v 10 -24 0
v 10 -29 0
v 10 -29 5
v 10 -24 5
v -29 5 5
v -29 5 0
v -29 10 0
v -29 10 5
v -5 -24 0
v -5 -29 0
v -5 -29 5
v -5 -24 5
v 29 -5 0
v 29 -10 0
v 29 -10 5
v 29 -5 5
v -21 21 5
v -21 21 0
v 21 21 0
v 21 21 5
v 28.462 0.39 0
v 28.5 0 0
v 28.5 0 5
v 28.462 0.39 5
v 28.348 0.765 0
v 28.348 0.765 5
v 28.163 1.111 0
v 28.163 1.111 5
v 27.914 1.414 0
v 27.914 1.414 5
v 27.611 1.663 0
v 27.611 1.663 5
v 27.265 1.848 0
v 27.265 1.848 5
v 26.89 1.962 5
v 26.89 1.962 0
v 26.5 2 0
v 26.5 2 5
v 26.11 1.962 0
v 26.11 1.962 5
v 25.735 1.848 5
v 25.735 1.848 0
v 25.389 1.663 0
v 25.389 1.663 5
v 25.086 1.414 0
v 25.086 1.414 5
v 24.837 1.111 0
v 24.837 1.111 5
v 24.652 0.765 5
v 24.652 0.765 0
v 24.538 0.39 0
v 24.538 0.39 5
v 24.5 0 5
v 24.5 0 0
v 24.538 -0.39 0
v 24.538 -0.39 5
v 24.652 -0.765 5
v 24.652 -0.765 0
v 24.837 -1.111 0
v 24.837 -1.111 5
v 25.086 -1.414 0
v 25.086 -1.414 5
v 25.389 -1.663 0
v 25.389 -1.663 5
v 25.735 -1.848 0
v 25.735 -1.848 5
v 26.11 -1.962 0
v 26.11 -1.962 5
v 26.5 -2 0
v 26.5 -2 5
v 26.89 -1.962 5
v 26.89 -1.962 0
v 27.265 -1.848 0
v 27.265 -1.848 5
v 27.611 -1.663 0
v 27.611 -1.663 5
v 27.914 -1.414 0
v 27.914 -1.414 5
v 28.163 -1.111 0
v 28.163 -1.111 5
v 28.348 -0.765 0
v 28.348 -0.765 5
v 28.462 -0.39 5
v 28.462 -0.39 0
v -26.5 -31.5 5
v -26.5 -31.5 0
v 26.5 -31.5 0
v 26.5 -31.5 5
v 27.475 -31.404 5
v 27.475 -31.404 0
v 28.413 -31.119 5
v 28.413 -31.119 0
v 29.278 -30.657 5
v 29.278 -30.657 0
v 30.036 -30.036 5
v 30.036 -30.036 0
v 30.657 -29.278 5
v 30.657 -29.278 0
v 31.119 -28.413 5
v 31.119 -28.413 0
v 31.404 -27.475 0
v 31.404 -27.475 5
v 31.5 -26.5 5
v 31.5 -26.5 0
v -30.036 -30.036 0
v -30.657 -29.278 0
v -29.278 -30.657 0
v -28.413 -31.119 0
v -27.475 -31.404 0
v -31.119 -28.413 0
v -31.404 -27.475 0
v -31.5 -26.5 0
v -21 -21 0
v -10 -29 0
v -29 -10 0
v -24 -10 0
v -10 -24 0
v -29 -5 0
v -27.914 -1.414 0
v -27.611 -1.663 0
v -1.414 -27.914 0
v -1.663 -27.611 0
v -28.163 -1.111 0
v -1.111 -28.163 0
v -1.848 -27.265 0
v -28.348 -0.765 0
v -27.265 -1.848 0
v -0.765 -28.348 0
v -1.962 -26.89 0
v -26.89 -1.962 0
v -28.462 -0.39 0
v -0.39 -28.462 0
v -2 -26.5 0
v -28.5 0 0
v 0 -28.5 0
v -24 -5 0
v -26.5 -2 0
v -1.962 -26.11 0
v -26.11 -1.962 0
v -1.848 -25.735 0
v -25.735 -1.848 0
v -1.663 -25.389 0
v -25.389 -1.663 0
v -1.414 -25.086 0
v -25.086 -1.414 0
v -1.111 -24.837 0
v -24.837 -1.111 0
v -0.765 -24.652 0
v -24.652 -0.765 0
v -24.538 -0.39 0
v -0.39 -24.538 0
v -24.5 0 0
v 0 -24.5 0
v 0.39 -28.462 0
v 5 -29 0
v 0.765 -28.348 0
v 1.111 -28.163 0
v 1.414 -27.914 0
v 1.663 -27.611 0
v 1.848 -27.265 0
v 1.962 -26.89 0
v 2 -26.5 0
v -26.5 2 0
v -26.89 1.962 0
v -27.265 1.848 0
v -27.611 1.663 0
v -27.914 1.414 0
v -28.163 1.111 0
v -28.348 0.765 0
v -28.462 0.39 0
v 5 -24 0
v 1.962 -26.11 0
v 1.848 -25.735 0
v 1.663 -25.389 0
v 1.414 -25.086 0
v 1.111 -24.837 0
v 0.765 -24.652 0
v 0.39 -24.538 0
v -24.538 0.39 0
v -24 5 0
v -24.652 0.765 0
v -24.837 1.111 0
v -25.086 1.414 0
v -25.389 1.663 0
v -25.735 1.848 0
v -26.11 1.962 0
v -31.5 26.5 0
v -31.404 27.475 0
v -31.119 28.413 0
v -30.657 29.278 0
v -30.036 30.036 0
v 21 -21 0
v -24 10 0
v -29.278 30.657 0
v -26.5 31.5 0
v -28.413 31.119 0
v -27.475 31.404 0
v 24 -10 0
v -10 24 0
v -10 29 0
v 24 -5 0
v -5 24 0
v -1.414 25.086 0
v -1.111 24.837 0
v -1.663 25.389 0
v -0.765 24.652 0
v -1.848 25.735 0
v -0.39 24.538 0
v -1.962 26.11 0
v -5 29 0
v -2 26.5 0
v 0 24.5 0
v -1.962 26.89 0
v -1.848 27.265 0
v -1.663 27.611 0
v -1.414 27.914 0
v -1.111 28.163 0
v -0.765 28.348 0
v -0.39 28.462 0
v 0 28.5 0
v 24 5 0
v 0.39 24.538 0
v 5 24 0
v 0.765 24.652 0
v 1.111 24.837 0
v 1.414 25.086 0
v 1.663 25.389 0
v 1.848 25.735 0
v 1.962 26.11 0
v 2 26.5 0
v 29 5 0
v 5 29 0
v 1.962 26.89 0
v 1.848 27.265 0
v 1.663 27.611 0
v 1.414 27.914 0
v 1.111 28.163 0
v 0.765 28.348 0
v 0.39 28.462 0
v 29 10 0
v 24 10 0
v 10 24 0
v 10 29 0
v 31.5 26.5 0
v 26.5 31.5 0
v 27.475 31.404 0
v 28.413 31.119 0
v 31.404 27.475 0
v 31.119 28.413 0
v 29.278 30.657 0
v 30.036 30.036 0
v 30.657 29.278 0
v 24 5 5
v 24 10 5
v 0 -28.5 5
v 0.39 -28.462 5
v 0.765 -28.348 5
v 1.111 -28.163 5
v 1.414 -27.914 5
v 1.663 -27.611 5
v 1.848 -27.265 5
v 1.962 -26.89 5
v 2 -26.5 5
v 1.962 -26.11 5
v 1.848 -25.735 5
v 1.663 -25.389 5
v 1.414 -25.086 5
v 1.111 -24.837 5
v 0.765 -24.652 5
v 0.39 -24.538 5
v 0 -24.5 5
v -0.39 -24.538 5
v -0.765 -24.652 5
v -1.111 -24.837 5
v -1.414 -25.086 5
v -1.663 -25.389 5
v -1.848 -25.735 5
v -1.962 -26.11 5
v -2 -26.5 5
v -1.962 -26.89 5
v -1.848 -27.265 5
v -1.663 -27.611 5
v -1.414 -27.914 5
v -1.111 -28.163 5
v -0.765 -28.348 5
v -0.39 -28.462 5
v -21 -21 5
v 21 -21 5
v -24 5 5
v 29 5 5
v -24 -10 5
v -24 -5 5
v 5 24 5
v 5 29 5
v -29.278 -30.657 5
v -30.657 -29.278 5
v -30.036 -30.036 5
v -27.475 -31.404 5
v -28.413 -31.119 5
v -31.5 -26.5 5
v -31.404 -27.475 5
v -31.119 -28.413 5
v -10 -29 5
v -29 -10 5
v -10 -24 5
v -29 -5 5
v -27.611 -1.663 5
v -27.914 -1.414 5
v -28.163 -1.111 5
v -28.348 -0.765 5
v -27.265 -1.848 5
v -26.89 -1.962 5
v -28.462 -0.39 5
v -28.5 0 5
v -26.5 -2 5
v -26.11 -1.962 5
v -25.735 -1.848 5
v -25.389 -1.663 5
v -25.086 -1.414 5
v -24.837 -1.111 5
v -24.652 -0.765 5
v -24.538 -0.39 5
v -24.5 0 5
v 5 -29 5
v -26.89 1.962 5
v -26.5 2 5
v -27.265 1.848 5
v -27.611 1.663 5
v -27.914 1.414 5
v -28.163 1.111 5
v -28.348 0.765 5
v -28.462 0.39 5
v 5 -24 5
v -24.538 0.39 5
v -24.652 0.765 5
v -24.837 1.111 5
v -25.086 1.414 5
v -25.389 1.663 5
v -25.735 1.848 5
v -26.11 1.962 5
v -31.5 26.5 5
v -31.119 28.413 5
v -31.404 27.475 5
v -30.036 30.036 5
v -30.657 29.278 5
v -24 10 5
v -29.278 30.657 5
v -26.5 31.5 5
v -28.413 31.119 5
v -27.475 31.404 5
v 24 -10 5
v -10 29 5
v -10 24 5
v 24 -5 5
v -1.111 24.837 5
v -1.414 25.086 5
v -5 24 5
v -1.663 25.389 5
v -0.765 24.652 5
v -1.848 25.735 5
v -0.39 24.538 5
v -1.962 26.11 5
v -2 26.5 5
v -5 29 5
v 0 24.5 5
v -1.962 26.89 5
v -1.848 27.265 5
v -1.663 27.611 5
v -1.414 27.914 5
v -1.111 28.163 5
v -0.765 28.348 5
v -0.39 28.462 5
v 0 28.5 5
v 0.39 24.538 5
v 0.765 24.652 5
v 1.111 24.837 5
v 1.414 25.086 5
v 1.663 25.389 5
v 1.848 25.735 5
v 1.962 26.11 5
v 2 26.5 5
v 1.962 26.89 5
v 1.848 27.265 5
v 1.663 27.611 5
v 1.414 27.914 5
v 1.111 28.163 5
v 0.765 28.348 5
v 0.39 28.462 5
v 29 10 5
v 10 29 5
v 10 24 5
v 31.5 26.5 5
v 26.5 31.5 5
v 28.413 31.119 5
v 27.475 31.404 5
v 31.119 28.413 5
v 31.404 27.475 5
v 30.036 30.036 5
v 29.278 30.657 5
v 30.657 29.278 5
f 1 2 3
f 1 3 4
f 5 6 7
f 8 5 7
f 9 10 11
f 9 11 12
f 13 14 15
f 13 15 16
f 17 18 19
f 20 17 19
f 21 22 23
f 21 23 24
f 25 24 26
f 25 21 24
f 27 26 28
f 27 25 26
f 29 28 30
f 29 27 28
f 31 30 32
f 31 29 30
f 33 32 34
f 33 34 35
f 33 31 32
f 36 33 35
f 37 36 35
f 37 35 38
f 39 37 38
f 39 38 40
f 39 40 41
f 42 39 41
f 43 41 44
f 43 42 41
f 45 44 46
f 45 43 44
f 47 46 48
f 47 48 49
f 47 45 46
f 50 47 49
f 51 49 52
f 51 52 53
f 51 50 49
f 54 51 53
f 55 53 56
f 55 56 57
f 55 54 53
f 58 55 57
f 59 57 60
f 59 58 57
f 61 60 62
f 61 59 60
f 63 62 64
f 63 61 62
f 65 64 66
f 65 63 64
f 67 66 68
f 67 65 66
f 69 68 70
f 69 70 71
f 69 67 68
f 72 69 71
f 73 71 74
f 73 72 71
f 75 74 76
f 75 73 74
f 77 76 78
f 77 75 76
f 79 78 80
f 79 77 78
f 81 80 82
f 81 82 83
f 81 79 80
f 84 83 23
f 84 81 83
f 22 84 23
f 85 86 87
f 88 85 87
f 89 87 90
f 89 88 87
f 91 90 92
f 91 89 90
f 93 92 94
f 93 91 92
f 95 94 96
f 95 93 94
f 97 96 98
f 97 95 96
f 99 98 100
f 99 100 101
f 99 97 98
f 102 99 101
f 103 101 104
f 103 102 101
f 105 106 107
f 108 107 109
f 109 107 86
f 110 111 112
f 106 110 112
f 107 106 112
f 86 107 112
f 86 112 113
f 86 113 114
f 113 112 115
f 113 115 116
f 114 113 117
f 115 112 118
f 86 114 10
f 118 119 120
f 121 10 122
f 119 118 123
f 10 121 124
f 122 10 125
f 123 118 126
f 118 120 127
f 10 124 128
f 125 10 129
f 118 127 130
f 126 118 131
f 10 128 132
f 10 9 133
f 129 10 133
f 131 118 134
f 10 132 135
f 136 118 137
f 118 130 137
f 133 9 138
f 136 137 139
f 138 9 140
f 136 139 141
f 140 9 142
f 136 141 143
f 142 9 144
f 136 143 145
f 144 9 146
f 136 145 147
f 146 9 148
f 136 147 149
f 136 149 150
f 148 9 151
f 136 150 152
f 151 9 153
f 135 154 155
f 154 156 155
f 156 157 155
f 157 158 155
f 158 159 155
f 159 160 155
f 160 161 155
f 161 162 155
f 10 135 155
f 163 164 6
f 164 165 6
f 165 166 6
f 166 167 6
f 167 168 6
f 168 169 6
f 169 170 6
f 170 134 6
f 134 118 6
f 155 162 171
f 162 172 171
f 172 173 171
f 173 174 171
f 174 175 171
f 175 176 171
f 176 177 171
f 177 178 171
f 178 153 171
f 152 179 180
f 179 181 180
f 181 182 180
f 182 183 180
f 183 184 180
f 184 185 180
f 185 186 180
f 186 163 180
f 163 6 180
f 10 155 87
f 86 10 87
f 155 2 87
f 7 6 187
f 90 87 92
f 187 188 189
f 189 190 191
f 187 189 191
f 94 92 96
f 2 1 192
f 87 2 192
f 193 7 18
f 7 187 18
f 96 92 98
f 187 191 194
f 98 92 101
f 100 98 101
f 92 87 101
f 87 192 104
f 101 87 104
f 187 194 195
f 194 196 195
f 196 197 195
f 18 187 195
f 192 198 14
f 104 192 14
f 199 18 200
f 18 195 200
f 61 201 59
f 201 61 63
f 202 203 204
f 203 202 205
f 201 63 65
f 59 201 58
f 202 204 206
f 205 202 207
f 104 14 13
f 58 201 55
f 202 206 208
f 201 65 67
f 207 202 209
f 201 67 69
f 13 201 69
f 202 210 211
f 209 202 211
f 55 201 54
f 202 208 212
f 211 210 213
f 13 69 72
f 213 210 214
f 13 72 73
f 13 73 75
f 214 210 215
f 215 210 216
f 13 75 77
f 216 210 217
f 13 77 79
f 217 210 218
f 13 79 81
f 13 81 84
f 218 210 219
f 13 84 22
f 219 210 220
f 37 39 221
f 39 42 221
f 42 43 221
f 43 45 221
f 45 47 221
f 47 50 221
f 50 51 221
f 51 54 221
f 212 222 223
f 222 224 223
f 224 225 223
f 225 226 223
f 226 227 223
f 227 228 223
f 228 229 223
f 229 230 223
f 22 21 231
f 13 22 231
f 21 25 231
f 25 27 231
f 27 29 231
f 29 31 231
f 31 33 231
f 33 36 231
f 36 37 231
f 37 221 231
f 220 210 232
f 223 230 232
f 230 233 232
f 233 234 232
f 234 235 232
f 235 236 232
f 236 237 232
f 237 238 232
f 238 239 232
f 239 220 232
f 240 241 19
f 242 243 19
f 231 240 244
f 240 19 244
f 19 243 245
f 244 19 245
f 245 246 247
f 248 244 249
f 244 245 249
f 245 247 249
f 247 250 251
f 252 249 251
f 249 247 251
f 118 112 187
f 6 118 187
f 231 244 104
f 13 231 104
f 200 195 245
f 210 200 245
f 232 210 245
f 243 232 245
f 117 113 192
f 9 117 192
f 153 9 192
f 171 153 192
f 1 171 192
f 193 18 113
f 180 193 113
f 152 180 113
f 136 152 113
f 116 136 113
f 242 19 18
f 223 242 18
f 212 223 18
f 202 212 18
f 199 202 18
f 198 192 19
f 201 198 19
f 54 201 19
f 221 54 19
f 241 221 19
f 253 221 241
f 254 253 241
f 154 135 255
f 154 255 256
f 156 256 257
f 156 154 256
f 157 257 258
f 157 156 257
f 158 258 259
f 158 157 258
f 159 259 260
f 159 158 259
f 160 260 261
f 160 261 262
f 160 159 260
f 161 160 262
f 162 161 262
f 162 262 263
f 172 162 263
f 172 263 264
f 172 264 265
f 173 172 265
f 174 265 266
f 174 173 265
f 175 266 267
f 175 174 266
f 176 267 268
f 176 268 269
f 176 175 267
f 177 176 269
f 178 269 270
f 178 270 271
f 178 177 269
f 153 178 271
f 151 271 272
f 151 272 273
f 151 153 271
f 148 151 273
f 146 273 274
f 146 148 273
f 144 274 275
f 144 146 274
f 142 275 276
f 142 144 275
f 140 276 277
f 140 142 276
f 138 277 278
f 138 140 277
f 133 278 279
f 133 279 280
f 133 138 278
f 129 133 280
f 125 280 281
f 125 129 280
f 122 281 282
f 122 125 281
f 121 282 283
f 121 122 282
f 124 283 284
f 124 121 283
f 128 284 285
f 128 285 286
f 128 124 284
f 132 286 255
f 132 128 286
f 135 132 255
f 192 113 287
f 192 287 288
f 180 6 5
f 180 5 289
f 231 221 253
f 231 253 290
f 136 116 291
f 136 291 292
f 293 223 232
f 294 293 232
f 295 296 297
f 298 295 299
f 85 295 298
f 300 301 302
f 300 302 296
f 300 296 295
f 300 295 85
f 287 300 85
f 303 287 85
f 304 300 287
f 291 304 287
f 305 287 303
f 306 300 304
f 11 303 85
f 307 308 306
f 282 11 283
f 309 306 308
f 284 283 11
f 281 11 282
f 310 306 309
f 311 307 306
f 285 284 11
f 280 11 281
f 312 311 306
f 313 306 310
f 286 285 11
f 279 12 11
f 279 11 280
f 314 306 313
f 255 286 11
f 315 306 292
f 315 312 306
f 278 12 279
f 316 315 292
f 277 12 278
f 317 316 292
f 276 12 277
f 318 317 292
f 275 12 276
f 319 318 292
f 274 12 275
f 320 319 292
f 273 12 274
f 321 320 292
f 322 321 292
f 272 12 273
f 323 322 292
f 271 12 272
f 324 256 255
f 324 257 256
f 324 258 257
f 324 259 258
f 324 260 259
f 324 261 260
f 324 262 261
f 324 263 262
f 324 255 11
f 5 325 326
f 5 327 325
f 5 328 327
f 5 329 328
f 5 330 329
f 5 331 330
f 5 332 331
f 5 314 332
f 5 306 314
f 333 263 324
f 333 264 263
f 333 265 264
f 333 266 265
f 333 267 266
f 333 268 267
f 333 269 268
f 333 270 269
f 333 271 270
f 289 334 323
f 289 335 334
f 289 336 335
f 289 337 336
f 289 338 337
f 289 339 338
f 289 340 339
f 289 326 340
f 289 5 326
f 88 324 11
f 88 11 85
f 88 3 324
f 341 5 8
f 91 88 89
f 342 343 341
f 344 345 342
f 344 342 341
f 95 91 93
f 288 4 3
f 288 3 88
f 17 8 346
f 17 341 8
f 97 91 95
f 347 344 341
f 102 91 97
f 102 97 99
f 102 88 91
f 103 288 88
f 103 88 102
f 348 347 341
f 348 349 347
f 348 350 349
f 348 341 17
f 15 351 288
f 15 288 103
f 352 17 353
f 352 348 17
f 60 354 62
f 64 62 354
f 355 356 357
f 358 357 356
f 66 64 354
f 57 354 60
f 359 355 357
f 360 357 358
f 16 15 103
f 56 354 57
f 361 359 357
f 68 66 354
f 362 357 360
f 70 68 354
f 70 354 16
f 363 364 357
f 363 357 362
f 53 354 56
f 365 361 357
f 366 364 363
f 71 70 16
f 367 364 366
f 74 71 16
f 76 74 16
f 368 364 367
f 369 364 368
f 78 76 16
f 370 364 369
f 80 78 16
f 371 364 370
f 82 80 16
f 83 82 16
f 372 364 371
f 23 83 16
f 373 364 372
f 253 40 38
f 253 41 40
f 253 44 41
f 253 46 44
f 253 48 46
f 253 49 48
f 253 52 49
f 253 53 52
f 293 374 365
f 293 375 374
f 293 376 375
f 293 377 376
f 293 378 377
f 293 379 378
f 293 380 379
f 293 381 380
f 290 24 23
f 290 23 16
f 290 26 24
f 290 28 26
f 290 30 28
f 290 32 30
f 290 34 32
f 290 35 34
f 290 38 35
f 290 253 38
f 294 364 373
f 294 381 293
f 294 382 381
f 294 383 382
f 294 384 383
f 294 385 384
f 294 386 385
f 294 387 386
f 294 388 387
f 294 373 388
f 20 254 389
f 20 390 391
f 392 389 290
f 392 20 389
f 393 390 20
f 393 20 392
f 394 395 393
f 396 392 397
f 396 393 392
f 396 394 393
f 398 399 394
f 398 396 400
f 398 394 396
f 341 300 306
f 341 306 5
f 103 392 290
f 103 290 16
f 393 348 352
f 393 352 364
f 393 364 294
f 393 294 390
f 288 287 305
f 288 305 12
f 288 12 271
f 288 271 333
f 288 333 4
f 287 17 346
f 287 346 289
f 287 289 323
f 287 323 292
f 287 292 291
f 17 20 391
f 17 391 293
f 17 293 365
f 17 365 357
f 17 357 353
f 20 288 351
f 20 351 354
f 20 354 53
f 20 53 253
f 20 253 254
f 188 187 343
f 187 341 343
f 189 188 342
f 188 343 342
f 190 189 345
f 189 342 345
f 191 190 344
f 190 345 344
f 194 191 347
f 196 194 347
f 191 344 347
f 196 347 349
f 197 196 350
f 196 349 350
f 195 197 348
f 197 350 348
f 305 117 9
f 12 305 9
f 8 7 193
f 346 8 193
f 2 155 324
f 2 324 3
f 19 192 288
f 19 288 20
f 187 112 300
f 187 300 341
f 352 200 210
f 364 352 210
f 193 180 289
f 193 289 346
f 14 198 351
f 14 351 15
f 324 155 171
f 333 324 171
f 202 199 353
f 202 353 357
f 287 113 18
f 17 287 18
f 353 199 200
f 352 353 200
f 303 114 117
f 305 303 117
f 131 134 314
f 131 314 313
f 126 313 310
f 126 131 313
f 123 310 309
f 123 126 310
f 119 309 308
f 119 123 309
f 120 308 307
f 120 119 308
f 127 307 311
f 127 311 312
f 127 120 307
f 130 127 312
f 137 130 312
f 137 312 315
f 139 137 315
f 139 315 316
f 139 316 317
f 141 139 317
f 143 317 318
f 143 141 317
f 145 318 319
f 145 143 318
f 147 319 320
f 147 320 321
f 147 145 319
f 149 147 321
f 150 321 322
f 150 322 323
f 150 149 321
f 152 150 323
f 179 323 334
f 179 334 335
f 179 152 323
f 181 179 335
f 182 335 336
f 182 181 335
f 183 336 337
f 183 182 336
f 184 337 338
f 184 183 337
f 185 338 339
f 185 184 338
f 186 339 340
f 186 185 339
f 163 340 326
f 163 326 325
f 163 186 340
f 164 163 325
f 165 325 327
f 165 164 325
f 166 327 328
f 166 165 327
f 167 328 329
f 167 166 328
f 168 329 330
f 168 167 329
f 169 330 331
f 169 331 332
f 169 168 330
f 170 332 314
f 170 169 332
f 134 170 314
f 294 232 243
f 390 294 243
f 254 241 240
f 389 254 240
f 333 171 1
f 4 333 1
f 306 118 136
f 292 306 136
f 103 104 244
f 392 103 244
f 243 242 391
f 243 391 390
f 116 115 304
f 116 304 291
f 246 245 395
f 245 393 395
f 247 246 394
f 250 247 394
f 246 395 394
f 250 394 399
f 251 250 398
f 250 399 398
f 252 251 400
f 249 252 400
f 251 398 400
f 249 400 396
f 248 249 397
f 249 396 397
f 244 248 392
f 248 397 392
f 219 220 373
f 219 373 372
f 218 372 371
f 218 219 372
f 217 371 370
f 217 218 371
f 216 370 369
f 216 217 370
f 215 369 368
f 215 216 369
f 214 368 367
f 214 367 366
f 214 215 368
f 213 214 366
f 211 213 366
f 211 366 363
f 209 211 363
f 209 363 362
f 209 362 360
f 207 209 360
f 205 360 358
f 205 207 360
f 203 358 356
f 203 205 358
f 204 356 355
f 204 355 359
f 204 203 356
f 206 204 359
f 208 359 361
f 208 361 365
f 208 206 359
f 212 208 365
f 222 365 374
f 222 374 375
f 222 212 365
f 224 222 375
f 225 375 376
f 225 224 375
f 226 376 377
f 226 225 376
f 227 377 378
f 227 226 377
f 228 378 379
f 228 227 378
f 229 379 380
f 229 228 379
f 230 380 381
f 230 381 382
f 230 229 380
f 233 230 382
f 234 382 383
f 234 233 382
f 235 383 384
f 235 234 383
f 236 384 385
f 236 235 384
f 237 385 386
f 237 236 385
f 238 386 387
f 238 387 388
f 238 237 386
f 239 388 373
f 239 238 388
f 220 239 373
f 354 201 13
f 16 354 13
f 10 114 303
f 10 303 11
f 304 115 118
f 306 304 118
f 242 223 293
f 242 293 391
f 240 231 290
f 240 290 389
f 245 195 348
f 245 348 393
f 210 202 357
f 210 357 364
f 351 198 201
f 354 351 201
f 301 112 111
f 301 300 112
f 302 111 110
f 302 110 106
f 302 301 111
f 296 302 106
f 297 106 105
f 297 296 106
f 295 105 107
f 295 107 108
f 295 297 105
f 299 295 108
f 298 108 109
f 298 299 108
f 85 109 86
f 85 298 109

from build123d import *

# Parameters (mm, degrees)
ESQUISSE1_W        = 63
ESQUISSE1_H        = 63
ESQUISSE1_R        = 2
ESQUISSE1_W_2      = 42
ESQUISSE1_H_2      = 42
ESQUISSE1_W_3      = 5
ESQUISSE1_H_3      = 5
BOSS_EXTRU_1_DEPTH = 5
CONG_1_R           = 5


with BuildPart() as part:
    # Esquisse1 → Boss.-Extru.1 (new body)
    with BuildSketch(Plane.XY):
        Rectangle(ESQUISSE1_W, ESQUISSE1_H)
        with Locations((26.5, 0)):
            Circle(ESQUISSE1_R, mode=Mode.SUBTRACT)
        with Locations(Location((-26.5, 0, 0), (0, 0, 180))):
            Circle(ESQUISSE1_R, mode=Mode.SUBTRACT)
        with Locations(Location((0, 26.5, 0), (0, 0, 90))):
            Circle(ESQUISSE1_R, mode=Mode.SUBTRACT)
        with Locations(Location((0, -26.5, 0), (0, 0, 270))):
            Circle(ESQUISSE1_R, mode=Mode.SUBTRACT)
        Rectangle(ESQUISSE1_W_2, ESQUISSE1_H_2, mode=Mode.SUBTRACT)
        with Locations((26.5, 7.5)):
            Rectangle(ESQUISSE1_W_3, ESQUISSE1_H_3, mode=Mode.SUBTRACT)
        with Locations((26.5, -7.5)):
            Rectangle(ESQUISSE1_W_3, ESQUISSE1_H_3, mode=Mode.SUBTRACT)
        with Locations((-26.5, 7.5)):
            Rectangle(ESQUISSE1_W_3, ESQUISSE1_H_3, mode=Mode.SUBTRACT)
        with Locations((-26.5, -7.5)):
            Rectangle(ESQUISSE1_W_3, ESQUISSE1_H_3, mode=Mode.SUBTRACT)
        with Locations((7.5, 26.5)):
            Rectangle(ESQUISSE1_W_3, ESQUISSE1_H_3, mode=Mode.SUBTRACT)
        with Locations((-7.5, 26.5)):
            Rectangle(ESQUISSE1_W_3, ESQUISSE1_H_3, mode=Mode.SUBTRACT)
        with Locations((7.5, -26.5)):
            Rectangle(ESQUISSE1_W_3, ESQUISSE1_H_3, mode=Mode.SUBTRACT)
        with Locations((-7.5, -26.5)):
            Rectangle(ESQUISSE1_W_3, ESQUISSE1_H_3, mode=Mode.SUBTRACT)
    extrude(amount=BOSS_EXTRU_1_DEPTH)

    # Congé1
    cong_1_edges = [part.edges().sort_by_distance(p)[0] for p in [
        (-31.5, 31.5, 2.5),
        (31.5, 31.5, 2.5),
        (31.5, -31.5, 2.5),
        (-31.5, -31.5, 2.5),
    ]]
    fillet(cong_1_edges, radius=CONG_1_R)


solid = part.part
